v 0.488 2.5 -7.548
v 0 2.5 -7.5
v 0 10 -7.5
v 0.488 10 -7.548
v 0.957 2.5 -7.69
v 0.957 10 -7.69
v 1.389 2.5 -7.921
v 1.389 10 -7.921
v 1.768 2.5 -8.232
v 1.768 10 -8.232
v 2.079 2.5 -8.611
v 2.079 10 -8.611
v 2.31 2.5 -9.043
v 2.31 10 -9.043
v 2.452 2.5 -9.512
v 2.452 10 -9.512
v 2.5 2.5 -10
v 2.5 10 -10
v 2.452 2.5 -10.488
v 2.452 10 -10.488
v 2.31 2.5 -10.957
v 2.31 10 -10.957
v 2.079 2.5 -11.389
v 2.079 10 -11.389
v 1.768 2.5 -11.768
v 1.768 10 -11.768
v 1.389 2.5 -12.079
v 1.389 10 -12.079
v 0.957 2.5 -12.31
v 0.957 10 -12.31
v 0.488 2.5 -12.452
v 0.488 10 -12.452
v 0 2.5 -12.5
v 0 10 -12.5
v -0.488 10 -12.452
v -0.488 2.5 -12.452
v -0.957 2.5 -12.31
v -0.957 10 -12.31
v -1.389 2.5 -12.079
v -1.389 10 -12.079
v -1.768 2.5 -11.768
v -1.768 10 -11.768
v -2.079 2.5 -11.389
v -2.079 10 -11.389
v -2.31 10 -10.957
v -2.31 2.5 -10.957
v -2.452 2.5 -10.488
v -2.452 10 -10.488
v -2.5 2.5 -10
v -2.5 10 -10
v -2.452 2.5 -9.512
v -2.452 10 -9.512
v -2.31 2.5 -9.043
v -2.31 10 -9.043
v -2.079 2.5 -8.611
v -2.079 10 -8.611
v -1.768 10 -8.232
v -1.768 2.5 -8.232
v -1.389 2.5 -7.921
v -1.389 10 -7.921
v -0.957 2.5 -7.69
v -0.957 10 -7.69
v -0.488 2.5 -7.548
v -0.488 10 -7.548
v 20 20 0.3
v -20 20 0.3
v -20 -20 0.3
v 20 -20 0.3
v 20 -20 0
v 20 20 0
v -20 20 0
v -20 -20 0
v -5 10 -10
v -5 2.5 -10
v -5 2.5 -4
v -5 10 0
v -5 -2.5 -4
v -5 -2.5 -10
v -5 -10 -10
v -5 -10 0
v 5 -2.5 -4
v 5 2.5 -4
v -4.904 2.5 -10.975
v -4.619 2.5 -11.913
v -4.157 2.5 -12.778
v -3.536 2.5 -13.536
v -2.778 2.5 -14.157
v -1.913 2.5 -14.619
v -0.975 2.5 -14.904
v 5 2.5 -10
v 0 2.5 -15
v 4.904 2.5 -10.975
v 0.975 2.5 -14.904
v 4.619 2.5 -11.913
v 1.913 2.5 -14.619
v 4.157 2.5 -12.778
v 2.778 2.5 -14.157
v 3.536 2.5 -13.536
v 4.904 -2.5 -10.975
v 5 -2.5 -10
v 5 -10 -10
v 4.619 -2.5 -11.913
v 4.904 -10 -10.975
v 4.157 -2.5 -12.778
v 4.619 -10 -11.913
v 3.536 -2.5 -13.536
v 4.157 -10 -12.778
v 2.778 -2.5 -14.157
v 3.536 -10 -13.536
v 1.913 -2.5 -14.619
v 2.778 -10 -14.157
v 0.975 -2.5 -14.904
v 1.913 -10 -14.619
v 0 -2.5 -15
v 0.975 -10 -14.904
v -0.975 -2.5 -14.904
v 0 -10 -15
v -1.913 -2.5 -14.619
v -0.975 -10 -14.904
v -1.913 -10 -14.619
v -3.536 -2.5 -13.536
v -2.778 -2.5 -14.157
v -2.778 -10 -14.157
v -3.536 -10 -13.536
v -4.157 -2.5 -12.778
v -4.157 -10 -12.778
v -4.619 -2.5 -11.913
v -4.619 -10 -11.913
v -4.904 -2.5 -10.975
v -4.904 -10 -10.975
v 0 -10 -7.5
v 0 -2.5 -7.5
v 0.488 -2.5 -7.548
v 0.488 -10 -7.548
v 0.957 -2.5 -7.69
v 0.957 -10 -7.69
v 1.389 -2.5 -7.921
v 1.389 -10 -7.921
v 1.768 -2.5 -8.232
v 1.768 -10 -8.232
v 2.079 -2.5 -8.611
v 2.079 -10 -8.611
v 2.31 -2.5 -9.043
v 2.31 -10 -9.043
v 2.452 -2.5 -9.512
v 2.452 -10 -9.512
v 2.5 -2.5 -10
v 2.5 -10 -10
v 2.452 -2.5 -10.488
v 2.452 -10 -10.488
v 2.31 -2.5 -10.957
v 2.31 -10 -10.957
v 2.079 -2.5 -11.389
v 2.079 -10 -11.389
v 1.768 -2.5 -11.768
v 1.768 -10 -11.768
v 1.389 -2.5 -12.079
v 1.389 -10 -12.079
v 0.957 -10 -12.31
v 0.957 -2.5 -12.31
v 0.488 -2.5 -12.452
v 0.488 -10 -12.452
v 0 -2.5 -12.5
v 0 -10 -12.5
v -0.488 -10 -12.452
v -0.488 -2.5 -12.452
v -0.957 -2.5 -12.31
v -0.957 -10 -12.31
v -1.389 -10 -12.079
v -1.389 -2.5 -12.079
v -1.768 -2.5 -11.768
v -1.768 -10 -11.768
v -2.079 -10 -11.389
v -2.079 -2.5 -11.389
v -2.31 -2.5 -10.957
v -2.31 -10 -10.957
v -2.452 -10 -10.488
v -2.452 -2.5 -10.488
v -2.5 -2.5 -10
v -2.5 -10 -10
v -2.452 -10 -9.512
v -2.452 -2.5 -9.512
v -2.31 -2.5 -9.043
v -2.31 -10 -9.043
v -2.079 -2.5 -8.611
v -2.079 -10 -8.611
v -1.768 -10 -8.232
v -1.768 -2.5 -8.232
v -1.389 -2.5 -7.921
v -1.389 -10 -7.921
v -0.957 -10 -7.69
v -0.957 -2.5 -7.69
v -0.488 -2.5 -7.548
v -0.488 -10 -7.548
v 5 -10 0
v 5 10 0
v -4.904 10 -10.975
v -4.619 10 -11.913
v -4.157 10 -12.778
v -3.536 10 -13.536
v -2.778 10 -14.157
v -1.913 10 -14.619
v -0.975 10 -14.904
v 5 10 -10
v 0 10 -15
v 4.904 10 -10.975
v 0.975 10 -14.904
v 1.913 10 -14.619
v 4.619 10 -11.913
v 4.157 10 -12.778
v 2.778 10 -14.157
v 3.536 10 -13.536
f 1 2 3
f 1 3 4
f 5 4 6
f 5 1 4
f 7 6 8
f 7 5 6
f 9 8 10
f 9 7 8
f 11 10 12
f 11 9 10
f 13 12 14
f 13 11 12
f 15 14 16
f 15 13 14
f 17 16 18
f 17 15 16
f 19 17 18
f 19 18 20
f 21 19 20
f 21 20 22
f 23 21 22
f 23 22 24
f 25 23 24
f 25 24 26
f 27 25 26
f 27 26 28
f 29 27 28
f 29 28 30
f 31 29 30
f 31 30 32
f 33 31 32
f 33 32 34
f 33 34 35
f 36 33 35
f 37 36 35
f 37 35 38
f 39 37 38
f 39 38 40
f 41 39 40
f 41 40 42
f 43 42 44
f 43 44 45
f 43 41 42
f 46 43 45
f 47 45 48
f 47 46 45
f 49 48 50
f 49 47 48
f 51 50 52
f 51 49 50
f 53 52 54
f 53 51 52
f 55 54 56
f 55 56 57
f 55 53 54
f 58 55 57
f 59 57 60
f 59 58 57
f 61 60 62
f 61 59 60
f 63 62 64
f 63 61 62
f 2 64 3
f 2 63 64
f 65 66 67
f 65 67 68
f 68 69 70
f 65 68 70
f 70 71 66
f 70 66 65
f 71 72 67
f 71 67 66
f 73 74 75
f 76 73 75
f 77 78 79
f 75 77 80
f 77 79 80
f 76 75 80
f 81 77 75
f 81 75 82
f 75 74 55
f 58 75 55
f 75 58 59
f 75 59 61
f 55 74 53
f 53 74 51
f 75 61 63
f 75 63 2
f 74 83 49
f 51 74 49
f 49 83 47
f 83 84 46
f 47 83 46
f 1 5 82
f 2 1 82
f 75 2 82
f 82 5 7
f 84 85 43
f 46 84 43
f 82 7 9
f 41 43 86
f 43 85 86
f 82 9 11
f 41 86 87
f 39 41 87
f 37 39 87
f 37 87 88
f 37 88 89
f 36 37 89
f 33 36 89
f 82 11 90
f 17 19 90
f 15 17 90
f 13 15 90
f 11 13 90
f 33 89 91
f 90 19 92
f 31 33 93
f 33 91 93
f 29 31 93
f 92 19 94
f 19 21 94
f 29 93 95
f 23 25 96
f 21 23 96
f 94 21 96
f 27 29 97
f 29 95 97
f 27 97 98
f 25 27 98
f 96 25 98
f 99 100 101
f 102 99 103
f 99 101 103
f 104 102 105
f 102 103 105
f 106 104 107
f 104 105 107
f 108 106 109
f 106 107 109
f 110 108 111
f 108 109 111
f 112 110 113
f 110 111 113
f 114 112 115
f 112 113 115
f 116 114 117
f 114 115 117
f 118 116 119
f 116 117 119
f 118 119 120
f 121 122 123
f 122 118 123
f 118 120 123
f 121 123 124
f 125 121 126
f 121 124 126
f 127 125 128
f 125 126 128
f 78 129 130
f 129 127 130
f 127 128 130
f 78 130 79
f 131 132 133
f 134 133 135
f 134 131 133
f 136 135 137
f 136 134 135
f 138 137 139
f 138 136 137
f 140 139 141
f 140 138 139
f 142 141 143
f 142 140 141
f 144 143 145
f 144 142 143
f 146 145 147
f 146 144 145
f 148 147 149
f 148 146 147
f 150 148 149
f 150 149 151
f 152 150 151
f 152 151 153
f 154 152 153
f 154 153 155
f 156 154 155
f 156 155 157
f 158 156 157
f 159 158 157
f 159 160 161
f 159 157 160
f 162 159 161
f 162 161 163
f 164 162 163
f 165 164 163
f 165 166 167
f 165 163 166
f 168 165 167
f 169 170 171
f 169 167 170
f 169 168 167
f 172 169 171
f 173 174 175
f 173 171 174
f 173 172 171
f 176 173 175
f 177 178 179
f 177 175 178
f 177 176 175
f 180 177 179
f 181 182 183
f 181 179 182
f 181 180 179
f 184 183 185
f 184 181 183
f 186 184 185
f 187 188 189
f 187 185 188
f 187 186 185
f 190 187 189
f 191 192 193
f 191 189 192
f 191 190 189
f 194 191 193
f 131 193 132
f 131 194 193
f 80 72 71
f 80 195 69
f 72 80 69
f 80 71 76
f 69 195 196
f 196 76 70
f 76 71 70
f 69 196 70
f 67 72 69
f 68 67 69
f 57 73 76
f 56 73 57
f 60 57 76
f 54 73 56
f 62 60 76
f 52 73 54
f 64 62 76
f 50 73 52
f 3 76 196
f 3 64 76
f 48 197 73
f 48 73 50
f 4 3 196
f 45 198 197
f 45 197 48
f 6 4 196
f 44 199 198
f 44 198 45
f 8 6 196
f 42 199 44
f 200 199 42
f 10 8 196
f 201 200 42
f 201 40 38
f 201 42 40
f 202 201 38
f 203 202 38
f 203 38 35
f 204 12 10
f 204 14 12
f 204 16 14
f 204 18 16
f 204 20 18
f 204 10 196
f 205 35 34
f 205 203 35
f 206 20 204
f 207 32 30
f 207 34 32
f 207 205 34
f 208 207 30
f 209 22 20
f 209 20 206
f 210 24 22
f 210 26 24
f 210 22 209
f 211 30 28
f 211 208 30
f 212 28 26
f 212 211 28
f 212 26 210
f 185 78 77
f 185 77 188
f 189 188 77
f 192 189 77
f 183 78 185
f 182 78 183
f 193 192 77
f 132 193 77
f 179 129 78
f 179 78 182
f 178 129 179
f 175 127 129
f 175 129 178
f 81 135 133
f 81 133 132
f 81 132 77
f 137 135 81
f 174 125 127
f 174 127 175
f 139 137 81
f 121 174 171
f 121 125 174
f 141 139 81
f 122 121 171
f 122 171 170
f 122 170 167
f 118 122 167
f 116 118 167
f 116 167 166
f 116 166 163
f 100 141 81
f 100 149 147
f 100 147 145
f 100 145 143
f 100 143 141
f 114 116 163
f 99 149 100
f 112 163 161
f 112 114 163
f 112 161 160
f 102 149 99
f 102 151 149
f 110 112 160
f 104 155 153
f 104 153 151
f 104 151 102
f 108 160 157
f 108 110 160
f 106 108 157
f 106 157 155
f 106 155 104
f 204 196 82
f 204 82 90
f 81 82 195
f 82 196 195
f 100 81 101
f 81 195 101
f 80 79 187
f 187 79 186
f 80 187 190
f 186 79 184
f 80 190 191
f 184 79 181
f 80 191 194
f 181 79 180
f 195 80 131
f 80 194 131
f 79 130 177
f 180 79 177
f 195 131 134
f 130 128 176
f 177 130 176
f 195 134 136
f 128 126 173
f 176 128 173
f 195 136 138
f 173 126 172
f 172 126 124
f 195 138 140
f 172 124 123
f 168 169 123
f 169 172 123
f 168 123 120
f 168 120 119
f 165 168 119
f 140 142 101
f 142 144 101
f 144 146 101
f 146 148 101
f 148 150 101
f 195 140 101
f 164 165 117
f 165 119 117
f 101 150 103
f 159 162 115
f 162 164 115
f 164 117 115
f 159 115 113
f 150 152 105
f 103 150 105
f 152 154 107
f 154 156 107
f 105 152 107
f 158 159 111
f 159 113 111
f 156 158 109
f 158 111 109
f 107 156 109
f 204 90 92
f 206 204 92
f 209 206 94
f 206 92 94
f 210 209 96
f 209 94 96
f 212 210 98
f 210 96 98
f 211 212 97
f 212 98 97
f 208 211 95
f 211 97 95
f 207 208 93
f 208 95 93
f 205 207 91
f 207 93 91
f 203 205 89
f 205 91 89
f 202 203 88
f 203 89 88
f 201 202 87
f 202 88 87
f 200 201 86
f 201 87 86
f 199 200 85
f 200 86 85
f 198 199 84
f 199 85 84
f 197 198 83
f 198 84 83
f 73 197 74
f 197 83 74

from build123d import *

# Parameters (mm, degrees)
CROQUIS1_W                   = 40
CROQUIS1_H                   = 40
SALIENTE_EXTRUIR1_DEPTH      = 0.3
SALIENTE_EXTRUIR2_DEPTH      = 10
SALIENTE_EXTRUIR2_DEPTH_BACK = 10
CROQUIS2_R                   = 2.5
CORTAR_EXTRUIR1_DEPTH        = 2.5
CORTAR_EXTRUIR1_DEPTH_BACK   = 2.5
CROQUIS3_W                   = 14.056155144
CROQUIS3_H                   = 12


with BuildPart() as part:
    # Croquis1 → Saliente-Extruir1 (new body)
    with BuildSketch(Plane.XY):
        Rectangle(CROQUIS1_W, CROQUIS1_H)
    extrude(amount=SALIENTE_EXTRUIR1_DEPTH)

    # Croquis2 → Saliente-Extruir2 (add, two sides: drawn at the far end of the back side and taken through both)
    with BuildSketch(Plane(origin=(0, 0, 0), x_dir=(1, 0, 0), z_dir=(0, 1, 0)).offset(-SALIENTE_EXTRUIR2_DEPTH_BACK)):
        with BuildLine():
            Line((-5, 10), (-5, 0))
            Line((-5, 0), (5, 0))
            Line((5, 0), (5, 10))
            ThreePointArc((5, 10), (0, 15), (-5, 10))
        make_face()
        with Locations(Location((0, 10, 0), (0, 0, 270))):
            Circle(CROQUIS2_R, mode=Mode.SUBTRACT)
    extrude(amount=SALIENTE_EXTRUIR2_DEPTH + SALIENTE_EXTRUIR2_DEPTH_BACK)

    # Croquis3 → Cortar-Extruir1 (cut, two sides: drawn at the far end of the back side and taken through both)
    with BuildSketch(Plane(origin=(0, 0, 0), x_dir=(1, 0, 0), z_dir=(0, 1, 0)).offset(-CORTAR_EXTRUIR1_DEPTH_BACK)):
        with Locations((0, 10)):
            Rectangle(CROQUIS3_W, CROQUIS3_H)
    extrude(amount=CORTAR_EXTRUIR1_DEPTH + CORTAR_EXTRUIR1_DEPTH_BACK, mode=Mode.SUBTRACT)


solid = part.part
